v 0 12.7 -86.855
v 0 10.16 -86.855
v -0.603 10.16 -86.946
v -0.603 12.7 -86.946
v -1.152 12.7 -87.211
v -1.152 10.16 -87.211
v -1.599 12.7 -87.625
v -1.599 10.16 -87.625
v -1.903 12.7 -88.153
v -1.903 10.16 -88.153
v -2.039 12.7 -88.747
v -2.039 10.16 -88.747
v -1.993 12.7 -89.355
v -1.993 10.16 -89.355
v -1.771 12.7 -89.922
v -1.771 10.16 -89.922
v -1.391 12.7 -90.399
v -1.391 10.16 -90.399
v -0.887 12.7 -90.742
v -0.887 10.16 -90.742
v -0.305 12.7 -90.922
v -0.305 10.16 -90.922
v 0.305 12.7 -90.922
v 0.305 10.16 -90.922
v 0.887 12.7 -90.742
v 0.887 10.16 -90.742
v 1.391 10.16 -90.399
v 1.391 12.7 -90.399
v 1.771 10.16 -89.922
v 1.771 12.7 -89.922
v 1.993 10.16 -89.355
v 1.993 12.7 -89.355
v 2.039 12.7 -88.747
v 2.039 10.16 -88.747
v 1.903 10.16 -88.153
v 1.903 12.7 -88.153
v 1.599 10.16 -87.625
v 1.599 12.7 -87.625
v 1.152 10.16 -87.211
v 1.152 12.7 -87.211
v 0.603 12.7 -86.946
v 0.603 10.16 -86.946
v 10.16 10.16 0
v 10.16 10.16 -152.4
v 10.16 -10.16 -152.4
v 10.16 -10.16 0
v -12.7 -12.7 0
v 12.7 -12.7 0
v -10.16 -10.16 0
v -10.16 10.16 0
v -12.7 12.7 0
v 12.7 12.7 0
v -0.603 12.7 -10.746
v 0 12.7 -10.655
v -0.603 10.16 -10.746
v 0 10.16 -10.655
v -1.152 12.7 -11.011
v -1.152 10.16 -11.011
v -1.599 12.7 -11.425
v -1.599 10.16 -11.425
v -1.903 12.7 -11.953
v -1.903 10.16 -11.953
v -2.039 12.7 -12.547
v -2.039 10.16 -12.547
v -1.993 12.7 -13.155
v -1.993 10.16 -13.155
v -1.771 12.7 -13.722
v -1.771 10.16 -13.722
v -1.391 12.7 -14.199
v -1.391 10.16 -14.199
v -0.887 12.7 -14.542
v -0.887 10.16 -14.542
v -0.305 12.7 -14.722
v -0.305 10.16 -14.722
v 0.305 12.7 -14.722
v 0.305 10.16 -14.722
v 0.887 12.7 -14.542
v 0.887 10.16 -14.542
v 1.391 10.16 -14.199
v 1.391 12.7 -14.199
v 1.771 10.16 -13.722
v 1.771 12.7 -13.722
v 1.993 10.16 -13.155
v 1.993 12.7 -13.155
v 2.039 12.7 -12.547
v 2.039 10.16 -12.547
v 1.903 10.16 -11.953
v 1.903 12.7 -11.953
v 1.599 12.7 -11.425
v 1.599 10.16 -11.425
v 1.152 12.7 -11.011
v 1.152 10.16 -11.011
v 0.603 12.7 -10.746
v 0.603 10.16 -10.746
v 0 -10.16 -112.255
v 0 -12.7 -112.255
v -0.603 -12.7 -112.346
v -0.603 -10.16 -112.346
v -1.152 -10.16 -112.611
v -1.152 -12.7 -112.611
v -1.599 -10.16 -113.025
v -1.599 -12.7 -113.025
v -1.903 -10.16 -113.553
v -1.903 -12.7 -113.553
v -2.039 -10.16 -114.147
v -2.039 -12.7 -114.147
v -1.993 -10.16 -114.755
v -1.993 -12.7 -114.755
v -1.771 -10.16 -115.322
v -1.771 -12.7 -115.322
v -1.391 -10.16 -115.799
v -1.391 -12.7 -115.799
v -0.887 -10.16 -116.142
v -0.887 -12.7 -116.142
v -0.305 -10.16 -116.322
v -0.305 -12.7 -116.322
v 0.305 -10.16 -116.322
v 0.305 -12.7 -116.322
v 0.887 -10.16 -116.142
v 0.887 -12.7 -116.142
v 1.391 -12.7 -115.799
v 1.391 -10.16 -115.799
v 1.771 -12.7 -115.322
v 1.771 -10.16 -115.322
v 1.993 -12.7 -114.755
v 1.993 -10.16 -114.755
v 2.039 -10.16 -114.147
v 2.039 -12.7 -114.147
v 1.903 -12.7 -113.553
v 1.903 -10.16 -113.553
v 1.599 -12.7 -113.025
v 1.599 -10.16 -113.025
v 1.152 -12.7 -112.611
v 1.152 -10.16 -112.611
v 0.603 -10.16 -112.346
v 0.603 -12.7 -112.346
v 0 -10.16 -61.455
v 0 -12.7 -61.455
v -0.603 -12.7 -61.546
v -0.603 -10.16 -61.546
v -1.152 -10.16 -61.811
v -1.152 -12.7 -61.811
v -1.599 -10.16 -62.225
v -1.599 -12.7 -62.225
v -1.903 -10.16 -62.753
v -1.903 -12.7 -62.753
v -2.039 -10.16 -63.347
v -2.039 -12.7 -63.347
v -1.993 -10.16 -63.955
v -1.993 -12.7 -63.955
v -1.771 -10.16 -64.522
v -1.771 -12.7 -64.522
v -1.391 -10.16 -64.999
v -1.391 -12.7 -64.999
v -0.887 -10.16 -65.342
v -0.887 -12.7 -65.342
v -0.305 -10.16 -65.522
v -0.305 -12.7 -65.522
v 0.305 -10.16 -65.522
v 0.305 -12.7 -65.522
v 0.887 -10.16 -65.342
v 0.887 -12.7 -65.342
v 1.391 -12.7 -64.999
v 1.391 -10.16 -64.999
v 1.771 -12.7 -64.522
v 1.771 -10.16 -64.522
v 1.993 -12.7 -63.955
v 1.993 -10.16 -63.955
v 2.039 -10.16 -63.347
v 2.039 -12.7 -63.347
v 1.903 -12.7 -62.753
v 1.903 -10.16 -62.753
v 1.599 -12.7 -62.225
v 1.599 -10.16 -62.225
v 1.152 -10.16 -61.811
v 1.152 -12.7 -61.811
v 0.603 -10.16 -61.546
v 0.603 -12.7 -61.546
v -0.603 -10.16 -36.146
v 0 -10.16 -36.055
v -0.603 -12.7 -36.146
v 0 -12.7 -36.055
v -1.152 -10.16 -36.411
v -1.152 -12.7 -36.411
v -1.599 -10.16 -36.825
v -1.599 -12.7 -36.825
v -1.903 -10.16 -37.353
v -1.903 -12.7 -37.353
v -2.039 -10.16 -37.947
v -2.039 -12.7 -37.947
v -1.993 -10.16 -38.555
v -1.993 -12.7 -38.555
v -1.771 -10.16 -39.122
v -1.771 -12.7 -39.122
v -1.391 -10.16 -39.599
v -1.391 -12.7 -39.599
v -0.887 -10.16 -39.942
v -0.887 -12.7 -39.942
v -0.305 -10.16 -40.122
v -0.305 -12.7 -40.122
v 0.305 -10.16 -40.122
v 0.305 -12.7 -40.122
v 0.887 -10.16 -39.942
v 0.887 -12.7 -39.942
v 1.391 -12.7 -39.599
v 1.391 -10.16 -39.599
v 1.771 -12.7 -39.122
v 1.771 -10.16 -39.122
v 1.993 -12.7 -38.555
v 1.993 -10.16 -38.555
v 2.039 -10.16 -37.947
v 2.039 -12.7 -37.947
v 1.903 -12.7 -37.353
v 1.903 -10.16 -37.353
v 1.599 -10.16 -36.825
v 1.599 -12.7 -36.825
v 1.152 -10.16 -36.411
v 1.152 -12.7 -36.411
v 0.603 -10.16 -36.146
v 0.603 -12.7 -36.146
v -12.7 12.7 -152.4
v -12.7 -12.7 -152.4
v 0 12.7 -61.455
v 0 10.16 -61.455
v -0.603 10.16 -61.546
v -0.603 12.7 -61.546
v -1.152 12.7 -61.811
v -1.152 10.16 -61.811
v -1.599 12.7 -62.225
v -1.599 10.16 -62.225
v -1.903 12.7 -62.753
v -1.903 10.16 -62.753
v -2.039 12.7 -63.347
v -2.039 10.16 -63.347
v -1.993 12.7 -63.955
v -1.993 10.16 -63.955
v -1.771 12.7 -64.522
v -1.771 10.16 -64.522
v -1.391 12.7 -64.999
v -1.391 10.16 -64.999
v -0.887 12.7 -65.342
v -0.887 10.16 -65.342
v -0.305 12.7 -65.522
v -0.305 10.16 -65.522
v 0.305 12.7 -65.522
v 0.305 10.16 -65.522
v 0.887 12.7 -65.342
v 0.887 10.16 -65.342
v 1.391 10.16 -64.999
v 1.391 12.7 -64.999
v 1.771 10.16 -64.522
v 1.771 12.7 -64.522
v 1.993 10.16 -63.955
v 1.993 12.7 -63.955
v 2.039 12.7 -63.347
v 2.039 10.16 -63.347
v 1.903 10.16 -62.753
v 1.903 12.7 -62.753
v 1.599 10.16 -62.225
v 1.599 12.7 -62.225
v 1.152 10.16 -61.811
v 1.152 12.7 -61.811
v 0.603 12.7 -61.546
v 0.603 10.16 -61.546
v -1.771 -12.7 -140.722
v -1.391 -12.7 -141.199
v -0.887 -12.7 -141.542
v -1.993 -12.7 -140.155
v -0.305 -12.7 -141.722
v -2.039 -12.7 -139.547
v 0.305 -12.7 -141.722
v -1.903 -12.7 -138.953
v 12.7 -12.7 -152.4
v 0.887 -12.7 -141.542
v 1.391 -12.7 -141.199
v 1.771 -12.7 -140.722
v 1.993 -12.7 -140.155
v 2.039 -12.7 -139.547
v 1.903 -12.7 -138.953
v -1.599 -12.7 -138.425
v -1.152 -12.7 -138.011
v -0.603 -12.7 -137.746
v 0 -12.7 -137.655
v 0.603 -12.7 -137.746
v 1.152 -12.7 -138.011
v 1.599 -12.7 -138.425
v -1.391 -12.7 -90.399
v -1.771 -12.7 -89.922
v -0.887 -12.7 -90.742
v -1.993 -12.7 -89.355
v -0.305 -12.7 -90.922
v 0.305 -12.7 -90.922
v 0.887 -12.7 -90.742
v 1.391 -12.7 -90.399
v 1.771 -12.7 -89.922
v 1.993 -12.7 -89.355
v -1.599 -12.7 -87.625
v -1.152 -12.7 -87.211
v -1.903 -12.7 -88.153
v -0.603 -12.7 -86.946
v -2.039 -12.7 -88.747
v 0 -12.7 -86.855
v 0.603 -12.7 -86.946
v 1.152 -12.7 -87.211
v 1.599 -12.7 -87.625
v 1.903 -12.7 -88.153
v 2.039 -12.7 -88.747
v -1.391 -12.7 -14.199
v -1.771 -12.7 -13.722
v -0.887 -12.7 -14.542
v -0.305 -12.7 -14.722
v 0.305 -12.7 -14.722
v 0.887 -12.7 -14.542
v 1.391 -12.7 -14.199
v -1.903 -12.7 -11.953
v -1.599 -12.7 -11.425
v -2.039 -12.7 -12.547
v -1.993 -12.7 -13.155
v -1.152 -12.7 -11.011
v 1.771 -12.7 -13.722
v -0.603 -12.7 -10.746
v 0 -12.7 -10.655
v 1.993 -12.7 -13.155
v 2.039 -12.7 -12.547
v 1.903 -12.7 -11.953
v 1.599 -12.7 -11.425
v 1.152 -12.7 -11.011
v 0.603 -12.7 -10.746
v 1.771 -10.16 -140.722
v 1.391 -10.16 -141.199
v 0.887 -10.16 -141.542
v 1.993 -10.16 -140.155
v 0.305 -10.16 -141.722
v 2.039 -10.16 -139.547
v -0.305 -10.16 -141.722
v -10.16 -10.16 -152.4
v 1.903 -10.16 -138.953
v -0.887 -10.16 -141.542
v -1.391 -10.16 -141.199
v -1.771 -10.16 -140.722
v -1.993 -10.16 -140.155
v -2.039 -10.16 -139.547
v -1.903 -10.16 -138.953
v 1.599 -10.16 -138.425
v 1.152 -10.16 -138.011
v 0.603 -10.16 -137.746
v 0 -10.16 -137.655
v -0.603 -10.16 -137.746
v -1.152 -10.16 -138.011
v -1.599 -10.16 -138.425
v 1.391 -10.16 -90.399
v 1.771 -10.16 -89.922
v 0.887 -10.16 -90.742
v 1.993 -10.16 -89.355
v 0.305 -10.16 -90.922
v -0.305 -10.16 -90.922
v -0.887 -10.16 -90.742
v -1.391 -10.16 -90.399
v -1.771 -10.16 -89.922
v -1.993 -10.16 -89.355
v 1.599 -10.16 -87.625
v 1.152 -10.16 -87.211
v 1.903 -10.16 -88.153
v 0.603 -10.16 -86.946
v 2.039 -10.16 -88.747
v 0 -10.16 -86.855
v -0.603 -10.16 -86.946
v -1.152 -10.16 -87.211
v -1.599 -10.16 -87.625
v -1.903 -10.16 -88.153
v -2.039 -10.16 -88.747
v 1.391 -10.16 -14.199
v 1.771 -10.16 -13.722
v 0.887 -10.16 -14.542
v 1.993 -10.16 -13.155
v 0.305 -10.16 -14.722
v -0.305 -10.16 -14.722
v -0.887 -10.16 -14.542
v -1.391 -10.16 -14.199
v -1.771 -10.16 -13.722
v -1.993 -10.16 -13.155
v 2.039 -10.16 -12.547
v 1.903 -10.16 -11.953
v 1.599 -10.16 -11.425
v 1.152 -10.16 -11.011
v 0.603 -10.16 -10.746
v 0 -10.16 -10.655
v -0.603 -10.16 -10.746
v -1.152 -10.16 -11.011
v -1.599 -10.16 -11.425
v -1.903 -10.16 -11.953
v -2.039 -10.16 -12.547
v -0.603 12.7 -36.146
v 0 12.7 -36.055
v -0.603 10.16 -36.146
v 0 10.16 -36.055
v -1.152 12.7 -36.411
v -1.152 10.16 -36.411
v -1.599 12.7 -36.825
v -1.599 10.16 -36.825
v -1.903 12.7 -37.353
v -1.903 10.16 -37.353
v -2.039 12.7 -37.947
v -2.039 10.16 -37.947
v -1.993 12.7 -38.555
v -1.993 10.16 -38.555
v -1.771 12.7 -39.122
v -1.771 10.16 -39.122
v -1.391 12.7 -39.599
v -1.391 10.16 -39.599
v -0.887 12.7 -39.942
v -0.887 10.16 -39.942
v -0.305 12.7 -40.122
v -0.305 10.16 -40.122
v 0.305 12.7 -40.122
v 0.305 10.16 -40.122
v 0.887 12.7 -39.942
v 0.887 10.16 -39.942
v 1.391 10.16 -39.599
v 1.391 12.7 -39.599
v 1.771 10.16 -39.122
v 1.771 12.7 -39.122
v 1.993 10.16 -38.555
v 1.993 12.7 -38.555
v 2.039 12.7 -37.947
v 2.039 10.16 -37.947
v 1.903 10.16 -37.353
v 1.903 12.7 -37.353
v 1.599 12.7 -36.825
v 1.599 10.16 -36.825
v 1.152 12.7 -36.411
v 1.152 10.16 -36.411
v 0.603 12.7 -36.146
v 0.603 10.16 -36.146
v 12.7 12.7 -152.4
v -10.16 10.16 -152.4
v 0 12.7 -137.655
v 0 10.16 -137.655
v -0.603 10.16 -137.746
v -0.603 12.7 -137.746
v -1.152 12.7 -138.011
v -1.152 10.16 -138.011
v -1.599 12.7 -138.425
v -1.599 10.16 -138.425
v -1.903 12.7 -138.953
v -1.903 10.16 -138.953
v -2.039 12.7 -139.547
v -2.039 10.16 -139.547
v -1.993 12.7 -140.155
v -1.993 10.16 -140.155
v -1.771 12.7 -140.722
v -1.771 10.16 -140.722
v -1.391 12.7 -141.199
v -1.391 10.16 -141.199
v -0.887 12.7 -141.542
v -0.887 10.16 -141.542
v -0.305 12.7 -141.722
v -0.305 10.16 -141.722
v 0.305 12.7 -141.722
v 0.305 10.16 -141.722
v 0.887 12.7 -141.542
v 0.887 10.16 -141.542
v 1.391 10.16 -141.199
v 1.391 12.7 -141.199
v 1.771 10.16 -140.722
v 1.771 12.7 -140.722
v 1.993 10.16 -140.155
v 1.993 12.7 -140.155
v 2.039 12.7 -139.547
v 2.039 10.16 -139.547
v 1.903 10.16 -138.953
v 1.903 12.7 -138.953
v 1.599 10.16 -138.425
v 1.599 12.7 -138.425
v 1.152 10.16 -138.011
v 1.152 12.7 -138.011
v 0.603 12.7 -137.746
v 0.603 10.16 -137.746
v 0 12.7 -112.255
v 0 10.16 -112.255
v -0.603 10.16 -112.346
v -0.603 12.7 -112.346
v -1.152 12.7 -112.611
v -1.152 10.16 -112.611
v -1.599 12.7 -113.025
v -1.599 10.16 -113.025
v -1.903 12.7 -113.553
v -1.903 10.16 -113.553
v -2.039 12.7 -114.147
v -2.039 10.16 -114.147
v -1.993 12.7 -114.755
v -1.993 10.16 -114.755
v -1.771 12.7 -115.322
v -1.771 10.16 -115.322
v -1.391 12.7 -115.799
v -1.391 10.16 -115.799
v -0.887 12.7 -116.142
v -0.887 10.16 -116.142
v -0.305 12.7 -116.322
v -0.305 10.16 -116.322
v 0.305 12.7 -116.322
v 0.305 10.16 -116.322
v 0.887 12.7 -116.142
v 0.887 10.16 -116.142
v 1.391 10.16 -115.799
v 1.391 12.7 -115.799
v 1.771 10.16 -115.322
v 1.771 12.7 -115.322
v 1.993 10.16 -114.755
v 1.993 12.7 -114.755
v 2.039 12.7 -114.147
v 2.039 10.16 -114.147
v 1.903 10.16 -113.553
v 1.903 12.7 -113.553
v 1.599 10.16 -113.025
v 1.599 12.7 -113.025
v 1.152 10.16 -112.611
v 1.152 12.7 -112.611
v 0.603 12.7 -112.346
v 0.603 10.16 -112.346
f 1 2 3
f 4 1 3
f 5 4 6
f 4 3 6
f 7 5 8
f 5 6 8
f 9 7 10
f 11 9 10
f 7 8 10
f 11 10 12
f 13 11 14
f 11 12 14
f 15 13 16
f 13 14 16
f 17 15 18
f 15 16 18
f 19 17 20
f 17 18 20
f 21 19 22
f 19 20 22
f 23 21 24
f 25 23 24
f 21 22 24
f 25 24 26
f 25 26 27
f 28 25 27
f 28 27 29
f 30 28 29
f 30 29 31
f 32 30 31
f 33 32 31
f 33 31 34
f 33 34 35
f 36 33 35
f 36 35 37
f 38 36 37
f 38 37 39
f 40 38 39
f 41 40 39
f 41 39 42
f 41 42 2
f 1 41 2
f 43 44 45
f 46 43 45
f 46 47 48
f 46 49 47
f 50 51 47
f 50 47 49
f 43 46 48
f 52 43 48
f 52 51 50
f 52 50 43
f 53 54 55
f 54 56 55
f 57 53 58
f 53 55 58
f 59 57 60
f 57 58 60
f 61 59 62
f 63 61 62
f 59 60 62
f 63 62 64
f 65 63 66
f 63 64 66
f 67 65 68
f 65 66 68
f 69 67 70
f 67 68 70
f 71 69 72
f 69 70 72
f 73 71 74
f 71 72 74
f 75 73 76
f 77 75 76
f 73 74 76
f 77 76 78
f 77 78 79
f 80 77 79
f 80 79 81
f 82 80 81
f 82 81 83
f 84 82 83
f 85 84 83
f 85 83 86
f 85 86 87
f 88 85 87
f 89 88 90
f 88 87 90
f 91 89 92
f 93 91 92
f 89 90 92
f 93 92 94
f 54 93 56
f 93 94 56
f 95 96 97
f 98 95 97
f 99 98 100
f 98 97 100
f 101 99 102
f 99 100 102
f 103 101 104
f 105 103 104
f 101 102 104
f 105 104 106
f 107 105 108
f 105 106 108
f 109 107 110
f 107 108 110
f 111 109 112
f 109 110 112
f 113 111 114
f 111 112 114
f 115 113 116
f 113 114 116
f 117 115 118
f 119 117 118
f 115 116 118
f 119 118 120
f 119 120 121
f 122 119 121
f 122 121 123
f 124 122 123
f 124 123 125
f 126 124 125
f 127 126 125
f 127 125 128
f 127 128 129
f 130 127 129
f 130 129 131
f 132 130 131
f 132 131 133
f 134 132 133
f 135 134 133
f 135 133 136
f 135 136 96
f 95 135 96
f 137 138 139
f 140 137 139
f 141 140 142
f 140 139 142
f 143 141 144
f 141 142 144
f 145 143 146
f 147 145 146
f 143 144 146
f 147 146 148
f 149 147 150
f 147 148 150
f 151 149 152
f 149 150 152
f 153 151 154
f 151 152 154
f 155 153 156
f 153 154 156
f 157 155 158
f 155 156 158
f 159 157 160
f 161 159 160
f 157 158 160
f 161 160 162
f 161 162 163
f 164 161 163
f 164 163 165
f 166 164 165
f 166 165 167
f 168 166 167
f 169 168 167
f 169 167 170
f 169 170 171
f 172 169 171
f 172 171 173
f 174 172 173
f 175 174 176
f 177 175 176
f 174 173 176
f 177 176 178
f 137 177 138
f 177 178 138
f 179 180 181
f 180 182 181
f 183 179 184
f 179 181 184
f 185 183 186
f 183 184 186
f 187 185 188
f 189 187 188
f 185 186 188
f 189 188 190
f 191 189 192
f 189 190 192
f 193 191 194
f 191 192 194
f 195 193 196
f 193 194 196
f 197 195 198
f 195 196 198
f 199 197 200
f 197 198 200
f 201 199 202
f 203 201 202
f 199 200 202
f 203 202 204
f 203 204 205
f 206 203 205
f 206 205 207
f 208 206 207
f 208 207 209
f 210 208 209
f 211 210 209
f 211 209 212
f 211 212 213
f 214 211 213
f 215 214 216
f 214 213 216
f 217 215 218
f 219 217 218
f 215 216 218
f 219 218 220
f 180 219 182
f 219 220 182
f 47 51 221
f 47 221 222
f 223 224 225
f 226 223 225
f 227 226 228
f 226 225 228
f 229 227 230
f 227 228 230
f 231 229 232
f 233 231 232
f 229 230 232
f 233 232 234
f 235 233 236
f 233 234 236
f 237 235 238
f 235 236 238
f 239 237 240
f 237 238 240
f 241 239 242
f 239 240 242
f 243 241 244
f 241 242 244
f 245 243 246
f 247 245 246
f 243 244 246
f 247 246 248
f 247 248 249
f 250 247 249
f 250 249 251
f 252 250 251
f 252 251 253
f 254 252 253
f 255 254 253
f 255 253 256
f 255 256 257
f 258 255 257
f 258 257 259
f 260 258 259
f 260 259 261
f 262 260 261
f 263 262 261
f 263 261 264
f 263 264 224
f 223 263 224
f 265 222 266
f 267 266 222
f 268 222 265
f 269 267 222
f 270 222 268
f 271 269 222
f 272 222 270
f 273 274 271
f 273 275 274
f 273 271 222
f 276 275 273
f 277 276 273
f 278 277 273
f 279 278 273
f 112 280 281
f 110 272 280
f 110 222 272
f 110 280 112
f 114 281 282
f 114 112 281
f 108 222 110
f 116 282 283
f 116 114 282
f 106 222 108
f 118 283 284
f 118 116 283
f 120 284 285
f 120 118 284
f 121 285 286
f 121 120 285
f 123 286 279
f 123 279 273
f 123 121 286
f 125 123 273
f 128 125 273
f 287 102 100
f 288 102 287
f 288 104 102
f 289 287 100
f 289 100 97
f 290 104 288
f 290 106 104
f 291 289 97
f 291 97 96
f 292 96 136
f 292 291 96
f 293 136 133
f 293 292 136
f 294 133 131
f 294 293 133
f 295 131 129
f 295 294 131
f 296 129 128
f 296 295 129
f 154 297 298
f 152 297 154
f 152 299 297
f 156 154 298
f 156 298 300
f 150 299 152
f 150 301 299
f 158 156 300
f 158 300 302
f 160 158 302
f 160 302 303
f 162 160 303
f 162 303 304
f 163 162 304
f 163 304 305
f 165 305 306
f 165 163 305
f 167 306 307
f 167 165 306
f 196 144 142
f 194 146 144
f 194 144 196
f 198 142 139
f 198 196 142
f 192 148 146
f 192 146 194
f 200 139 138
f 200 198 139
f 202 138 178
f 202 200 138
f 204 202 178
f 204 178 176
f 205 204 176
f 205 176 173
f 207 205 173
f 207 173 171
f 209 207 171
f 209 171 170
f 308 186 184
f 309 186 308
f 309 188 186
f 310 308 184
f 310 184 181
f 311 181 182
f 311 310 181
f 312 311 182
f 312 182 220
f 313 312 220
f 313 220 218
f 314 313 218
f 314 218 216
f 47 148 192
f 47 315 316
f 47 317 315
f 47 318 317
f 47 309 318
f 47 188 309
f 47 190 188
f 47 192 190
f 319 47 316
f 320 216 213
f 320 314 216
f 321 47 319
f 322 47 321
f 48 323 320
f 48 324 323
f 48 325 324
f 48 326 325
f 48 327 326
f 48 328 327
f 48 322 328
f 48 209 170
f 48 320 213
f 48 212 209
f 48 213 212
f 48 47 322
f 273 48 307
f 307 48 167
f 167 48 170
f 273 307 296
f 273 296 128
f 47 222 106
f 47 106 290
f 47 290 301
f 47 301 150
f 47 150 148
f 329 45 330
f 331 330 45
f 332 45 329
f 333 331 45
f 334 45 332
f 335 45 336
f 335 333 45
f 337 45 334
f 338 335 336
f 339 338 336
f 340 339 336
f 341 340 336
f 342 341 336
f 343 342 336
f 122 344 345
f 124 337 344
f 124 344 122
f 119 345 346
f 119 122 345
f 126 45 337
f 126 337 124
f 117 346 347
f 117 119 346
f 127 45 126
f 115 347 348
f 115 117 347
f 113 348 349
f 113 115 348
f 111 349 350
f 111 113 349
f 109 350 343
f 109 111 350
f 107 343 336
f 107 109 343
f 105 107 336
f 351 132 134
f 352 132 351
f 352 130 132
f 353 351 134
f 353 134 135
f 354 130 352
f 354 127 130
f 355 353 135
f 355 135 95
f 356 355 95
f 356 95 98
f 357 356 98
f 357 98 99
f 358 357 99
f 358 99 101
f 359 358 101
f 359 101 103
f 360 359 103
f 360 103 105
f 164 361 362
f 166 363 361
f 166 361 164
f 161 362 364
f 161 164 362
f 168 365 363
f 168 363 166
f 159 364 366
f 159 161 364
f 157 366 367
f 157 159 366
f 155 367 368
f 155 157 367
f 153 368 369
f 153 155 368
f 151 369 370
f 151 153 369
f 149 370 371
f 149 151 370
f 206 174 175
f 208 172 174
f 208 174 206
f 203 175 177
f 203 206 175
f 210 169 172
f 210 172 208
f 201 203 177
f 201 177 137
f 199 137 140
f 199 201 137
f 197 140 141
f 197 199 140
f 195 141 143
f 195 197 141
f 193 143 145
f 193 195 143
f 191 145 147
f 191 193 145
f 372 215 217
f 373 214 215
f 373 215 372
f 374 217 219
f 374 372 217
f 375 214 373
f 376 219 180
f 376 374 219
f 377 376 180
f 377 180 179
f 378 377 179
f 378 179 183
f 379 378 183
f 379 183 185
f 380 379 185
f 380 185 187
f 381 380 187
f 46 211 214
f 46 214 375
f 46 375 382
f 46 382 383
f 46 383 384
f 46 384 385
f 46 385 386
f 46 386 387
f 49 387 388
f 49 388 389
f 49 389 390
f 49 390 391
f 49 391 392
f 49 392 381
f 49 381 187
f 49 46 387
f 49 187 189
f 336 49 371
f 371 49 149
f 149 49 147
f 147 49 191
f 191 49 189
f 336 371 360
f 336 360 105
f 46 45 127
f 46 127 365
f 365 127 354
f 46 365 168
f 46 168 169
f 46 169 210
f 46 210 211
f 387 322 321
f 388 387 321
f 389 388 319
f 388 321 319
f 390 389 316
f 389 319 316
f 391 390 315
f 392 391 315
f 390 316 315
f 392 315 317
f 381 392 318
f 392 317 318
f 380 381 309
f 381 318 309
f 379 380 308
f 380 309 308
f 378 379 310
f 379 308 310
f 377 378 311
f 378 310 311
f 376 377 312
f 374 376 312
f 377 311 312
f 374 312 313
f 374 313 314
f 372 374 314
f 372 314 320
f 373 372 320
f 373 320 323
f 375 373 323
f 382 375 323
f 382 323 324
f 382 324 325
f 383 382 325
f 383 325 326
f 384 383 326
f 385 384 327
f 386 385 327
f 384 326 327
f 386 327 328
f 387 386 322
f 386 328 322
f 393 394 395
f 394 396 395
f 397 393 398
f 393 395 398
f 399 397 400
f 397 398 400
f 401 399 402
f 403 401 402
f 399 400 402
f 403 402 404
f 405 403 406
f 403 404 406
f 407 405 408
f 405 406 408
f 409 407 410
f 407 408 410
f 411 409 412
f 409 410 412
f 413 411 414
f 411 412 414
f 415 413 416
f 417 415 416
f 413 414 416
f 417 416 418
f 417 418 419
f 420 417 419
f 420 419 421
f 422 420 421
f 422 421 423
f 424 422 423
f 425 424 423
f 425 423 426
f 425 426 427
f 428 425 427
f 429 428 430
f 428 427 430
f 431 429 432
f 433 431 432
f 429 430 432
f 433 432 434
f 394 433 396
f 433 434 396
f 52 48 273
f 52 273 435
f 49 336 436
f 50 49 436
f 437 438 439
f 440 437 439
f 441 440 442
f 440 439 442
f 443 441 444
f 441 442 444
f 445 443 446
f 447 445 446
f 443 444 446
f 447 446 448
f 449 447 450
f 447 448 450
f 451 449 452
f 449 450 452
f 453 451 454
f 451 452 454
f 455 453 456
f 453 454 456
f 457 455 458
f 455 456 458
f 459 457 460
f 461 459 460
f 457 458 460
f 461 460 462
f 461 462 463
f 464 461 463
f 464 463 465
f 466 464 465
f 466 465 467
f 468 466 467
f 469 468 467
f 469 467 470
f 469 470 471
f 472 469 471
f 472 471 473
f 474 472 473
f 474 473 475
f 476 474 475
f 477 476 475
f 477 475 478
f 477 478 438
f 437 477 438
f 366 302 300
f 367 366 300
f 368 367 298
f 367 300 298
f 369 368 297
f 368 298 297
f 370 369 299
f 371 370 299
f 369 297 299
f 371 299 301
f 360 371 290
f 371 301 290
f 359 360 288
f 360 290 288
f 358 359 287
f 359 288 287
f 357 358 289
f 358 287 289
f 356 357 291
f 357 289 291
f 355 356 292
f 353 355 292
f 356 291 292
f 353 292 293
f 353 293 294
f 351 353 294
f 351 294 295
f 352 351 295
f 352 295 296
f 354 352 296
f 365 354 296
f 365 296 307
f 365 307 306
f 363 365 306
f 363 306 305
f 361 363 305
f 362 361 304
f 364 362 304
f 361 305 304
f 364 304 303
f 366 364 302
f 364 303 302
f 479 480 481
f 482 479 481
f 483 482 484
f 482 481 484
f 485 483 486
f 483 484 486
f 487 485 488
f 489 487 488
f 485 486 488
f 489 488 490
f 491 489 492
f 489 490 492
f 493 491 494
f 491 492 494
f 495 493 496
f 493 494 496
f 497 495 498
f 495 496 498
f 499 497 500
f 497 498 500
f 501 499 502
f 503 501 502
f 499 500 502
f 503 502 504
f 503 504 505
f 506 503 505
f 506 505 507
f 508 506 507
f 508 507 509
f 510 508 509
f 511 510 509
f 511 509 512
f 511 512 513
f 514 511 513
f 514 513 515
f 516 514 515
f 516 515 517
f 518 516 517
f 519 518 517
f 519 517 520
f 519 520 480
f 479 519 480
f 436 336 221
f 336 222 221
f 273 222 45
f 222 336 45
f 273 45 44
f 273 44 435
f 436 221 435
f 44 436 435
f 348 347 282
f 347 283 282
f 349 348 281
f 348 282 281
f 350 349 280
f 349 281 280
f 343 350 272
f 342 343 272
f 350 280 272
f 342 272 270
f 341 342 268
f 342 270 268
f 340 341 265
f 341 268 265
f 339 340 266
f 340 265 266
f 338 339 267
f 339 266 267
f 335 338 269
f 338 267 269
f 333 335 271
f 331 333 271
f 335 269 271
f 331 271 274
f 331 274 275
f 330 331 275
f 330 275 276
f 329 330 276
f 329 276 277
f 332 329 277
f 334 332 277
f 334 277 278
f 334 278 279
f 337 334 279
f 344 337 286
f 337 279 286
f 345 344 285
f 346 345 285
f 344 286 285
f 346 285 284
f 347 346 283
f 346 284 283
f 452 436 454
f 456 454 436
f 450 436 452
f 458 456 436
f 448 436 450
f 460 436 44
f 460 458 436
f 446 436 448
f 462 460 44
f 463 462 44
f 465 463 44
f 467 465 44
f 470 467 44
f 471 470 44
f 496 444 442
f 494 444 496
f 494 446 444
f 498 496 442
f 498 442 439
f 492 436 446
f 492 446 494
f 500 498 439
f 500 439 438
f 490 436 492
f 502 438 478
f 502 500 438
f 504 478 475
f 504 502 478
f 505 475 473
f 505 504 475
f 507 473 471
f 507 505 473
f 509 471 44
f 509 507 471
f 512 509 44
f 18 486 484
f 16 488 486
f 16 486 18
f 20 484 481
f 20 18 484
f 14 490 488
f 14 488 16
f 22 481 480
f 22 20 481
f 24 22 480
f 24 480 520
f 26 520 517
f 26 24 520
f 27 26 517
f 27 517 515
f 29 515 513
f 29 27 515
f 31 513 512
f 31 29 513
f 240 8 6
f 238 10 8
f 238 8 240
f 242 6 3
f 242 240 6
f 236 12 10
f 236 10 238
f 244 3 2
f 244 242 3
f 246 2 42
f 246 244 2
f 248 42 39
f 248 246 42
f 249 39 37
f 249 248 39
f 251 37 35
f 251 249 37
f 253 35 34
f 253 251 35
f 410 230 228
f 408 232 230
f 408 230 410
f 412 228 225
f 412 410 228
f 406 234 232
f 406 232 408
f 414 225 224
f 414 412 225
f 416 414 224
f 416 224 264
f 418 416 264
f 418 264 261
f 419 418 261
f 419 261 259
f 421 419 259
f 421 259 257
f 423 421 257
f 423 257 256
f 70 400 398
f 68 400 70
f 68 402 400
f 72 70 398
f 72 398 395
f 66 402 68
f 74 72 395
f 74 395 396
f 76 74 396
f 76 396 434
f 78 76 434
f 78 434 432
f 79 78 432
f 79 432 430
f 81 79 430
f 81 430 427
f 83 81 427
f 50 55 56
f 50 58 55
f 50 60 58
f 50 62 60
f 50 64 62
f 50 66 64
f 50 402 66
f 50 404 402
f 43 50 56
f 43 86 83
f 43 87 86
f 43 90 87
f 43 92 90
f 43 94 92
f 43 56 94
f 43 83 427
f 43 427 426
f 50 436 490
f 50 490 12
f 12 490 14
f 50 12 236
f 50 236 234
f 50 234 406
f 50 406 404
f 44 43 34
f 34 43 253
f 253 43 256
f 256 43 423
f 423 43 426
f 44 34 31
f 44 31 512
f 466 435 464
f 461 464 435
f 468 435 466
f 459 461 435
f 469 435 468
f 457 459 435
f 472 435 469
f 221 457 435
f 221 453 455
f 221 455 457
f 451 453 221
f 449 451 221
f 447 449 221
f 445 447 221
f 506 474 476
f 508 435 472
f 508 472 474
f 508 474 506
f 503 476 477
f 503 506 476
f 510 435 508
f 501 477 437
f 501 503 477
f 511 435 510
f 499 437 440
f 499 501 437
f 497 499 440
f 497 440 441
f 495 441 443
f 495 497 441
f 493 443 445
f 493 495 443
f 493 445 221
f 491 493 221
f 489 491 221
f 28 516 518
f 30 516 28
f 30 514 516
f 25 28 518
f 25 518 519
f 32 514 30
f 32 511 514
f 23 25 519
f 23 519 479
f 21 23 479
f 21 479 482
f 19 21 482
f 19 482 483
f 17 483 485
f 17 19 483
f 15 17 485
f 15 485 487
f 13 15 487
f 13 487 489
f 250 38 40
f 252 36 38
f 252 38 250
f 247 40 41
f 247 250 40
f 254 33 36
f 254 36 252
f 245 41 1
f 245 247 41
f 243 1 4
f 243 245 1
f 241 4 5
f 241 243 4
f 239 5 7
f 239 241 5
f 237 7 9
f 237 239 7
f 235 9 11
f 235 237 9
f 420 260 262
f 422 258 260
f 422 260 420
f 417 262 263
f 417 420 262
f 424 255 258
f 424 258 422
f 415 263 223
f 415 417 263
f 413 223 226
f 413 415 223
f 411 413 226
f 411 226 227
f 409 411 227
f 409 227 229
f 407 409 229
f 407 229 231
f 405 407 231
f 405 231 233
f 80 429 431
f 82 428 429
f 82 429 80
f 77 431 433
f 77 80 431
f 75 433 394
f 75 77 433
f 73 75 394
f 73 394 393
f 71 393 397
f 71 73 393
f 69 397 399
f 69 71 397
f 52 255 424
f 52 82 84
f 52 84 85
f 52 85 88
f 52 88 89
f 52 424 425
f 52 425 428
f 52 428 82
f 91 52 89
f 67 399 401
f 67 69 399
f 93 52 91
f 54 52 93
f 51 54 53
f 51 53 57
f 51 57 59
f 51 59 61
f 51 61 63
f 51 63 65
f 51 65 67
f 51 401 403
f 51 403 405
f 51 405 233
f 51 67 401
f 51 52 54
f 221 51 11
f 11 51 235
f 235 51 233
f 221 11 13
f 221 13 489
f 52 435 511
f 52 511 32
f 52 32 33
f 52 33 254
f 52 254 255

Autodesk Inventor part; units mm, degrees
ref_plane "YZ Plane" through (0, 0, 0) normal (1, 0, 0) x (0, 1, 0)
ref_plane "XZ Plane" through (0, 0, 0) normal (0, 1, 0) x (-1, 0, 0)
ref_plane "XY Plane" through (0, 0, 0) normal (0, 0, 1) x (1, 0, 0)
sketch "Sketch1" plane through (0, 0, 0) normal (0, 0, 1) x (1, 0, 0)
  line L0 (-12.7, -12.7) -> (12.7, -12.7)
  line L1 (12.7, -12.7) -> (12.7, 12.7)
  line L2 (12.7, 12.7) -> (-12.7, 12.7)
  line L3 (-12.7, 12.7) -> (-12.7, -12.7)
  line L4 (-12.7, -12.7) -> (12.7, 12.7) construction
  line L5 (12.7, -12.7) -> (-12.7, 12.7) construction
  line L6 (-10.16, 10.16) -> (10.16, 10.16)
  line L7 (10.16, 10.16) -> (10.16, -10.16)
  line L8 (10.16, -10.16) -> (-10.16, -10.16)
  line L9 (-10.16, -10.16) -> (-10.16, 10.16)
  point P0 (0, 0)
  dimension "l1" = 25.4
  dimension "l2" = 25.4
  dimension "wt" = 2.54
extrude "Extrusion1" add sketch "Sketch1" against normal blind 152.4
sketch "Sketch2" plane through (-12.7, 12.7, 0) normal (0, 1, 0) x (1, 0, 0)
  line L0 (25.4, 0) -> (0, 0) projected
  line L1 (25.4, 0) -> (25.4, 152.4) projected
  line L2 (0, 152.4) -> (25.4, 152.4) projected
  line L3 (0, 0) -> (0, 152.4) projected
  point P0 (12.7, 0)
  point P1 (12.7, 12.7)
  dimension "d5" = 25.4
  dimension "d6" = 12.7
  dimension "d7" = 12.7
hole "Hole3" at (0, 12.7, -12.7) direction (0, -1, 0) diameter 4.0894 end through all
sketch "Sketch3" plane through (12.7, -12.7, 0) normal (1, 0, 0) x (0, 0, -1)
  line L0 (0, 0) -> (0, 25.4) projected
  line L1 (0, 0) -> (152.4, 0) projected
  line L2 (152.4, 25.4) -> (152.4, 0) projected
  line L3 (0, 25.4) -> (152.4, 25.4) projected
  point P0 (0, 12.7)
  point P1 (25.4, 12.7)
  dimension "d22" = 25.4
  dimension "d23" = 12.7
  dimension "d24" = 25.4
hole "Hole4" [suppressed]
pattern_linear "Rectangular Pattern1" count 7 spacing 25.4 along (0, 0, -1) of "Hole3"
pattern_linear "Rectangular Pattern2" [suppressed]
equation "\"d6\" = 0.5 * d5"
equation "\"d23\" = 0.5 * d22"
properties part number "versatubing_1x2x100" material "Aluminum 6061"
